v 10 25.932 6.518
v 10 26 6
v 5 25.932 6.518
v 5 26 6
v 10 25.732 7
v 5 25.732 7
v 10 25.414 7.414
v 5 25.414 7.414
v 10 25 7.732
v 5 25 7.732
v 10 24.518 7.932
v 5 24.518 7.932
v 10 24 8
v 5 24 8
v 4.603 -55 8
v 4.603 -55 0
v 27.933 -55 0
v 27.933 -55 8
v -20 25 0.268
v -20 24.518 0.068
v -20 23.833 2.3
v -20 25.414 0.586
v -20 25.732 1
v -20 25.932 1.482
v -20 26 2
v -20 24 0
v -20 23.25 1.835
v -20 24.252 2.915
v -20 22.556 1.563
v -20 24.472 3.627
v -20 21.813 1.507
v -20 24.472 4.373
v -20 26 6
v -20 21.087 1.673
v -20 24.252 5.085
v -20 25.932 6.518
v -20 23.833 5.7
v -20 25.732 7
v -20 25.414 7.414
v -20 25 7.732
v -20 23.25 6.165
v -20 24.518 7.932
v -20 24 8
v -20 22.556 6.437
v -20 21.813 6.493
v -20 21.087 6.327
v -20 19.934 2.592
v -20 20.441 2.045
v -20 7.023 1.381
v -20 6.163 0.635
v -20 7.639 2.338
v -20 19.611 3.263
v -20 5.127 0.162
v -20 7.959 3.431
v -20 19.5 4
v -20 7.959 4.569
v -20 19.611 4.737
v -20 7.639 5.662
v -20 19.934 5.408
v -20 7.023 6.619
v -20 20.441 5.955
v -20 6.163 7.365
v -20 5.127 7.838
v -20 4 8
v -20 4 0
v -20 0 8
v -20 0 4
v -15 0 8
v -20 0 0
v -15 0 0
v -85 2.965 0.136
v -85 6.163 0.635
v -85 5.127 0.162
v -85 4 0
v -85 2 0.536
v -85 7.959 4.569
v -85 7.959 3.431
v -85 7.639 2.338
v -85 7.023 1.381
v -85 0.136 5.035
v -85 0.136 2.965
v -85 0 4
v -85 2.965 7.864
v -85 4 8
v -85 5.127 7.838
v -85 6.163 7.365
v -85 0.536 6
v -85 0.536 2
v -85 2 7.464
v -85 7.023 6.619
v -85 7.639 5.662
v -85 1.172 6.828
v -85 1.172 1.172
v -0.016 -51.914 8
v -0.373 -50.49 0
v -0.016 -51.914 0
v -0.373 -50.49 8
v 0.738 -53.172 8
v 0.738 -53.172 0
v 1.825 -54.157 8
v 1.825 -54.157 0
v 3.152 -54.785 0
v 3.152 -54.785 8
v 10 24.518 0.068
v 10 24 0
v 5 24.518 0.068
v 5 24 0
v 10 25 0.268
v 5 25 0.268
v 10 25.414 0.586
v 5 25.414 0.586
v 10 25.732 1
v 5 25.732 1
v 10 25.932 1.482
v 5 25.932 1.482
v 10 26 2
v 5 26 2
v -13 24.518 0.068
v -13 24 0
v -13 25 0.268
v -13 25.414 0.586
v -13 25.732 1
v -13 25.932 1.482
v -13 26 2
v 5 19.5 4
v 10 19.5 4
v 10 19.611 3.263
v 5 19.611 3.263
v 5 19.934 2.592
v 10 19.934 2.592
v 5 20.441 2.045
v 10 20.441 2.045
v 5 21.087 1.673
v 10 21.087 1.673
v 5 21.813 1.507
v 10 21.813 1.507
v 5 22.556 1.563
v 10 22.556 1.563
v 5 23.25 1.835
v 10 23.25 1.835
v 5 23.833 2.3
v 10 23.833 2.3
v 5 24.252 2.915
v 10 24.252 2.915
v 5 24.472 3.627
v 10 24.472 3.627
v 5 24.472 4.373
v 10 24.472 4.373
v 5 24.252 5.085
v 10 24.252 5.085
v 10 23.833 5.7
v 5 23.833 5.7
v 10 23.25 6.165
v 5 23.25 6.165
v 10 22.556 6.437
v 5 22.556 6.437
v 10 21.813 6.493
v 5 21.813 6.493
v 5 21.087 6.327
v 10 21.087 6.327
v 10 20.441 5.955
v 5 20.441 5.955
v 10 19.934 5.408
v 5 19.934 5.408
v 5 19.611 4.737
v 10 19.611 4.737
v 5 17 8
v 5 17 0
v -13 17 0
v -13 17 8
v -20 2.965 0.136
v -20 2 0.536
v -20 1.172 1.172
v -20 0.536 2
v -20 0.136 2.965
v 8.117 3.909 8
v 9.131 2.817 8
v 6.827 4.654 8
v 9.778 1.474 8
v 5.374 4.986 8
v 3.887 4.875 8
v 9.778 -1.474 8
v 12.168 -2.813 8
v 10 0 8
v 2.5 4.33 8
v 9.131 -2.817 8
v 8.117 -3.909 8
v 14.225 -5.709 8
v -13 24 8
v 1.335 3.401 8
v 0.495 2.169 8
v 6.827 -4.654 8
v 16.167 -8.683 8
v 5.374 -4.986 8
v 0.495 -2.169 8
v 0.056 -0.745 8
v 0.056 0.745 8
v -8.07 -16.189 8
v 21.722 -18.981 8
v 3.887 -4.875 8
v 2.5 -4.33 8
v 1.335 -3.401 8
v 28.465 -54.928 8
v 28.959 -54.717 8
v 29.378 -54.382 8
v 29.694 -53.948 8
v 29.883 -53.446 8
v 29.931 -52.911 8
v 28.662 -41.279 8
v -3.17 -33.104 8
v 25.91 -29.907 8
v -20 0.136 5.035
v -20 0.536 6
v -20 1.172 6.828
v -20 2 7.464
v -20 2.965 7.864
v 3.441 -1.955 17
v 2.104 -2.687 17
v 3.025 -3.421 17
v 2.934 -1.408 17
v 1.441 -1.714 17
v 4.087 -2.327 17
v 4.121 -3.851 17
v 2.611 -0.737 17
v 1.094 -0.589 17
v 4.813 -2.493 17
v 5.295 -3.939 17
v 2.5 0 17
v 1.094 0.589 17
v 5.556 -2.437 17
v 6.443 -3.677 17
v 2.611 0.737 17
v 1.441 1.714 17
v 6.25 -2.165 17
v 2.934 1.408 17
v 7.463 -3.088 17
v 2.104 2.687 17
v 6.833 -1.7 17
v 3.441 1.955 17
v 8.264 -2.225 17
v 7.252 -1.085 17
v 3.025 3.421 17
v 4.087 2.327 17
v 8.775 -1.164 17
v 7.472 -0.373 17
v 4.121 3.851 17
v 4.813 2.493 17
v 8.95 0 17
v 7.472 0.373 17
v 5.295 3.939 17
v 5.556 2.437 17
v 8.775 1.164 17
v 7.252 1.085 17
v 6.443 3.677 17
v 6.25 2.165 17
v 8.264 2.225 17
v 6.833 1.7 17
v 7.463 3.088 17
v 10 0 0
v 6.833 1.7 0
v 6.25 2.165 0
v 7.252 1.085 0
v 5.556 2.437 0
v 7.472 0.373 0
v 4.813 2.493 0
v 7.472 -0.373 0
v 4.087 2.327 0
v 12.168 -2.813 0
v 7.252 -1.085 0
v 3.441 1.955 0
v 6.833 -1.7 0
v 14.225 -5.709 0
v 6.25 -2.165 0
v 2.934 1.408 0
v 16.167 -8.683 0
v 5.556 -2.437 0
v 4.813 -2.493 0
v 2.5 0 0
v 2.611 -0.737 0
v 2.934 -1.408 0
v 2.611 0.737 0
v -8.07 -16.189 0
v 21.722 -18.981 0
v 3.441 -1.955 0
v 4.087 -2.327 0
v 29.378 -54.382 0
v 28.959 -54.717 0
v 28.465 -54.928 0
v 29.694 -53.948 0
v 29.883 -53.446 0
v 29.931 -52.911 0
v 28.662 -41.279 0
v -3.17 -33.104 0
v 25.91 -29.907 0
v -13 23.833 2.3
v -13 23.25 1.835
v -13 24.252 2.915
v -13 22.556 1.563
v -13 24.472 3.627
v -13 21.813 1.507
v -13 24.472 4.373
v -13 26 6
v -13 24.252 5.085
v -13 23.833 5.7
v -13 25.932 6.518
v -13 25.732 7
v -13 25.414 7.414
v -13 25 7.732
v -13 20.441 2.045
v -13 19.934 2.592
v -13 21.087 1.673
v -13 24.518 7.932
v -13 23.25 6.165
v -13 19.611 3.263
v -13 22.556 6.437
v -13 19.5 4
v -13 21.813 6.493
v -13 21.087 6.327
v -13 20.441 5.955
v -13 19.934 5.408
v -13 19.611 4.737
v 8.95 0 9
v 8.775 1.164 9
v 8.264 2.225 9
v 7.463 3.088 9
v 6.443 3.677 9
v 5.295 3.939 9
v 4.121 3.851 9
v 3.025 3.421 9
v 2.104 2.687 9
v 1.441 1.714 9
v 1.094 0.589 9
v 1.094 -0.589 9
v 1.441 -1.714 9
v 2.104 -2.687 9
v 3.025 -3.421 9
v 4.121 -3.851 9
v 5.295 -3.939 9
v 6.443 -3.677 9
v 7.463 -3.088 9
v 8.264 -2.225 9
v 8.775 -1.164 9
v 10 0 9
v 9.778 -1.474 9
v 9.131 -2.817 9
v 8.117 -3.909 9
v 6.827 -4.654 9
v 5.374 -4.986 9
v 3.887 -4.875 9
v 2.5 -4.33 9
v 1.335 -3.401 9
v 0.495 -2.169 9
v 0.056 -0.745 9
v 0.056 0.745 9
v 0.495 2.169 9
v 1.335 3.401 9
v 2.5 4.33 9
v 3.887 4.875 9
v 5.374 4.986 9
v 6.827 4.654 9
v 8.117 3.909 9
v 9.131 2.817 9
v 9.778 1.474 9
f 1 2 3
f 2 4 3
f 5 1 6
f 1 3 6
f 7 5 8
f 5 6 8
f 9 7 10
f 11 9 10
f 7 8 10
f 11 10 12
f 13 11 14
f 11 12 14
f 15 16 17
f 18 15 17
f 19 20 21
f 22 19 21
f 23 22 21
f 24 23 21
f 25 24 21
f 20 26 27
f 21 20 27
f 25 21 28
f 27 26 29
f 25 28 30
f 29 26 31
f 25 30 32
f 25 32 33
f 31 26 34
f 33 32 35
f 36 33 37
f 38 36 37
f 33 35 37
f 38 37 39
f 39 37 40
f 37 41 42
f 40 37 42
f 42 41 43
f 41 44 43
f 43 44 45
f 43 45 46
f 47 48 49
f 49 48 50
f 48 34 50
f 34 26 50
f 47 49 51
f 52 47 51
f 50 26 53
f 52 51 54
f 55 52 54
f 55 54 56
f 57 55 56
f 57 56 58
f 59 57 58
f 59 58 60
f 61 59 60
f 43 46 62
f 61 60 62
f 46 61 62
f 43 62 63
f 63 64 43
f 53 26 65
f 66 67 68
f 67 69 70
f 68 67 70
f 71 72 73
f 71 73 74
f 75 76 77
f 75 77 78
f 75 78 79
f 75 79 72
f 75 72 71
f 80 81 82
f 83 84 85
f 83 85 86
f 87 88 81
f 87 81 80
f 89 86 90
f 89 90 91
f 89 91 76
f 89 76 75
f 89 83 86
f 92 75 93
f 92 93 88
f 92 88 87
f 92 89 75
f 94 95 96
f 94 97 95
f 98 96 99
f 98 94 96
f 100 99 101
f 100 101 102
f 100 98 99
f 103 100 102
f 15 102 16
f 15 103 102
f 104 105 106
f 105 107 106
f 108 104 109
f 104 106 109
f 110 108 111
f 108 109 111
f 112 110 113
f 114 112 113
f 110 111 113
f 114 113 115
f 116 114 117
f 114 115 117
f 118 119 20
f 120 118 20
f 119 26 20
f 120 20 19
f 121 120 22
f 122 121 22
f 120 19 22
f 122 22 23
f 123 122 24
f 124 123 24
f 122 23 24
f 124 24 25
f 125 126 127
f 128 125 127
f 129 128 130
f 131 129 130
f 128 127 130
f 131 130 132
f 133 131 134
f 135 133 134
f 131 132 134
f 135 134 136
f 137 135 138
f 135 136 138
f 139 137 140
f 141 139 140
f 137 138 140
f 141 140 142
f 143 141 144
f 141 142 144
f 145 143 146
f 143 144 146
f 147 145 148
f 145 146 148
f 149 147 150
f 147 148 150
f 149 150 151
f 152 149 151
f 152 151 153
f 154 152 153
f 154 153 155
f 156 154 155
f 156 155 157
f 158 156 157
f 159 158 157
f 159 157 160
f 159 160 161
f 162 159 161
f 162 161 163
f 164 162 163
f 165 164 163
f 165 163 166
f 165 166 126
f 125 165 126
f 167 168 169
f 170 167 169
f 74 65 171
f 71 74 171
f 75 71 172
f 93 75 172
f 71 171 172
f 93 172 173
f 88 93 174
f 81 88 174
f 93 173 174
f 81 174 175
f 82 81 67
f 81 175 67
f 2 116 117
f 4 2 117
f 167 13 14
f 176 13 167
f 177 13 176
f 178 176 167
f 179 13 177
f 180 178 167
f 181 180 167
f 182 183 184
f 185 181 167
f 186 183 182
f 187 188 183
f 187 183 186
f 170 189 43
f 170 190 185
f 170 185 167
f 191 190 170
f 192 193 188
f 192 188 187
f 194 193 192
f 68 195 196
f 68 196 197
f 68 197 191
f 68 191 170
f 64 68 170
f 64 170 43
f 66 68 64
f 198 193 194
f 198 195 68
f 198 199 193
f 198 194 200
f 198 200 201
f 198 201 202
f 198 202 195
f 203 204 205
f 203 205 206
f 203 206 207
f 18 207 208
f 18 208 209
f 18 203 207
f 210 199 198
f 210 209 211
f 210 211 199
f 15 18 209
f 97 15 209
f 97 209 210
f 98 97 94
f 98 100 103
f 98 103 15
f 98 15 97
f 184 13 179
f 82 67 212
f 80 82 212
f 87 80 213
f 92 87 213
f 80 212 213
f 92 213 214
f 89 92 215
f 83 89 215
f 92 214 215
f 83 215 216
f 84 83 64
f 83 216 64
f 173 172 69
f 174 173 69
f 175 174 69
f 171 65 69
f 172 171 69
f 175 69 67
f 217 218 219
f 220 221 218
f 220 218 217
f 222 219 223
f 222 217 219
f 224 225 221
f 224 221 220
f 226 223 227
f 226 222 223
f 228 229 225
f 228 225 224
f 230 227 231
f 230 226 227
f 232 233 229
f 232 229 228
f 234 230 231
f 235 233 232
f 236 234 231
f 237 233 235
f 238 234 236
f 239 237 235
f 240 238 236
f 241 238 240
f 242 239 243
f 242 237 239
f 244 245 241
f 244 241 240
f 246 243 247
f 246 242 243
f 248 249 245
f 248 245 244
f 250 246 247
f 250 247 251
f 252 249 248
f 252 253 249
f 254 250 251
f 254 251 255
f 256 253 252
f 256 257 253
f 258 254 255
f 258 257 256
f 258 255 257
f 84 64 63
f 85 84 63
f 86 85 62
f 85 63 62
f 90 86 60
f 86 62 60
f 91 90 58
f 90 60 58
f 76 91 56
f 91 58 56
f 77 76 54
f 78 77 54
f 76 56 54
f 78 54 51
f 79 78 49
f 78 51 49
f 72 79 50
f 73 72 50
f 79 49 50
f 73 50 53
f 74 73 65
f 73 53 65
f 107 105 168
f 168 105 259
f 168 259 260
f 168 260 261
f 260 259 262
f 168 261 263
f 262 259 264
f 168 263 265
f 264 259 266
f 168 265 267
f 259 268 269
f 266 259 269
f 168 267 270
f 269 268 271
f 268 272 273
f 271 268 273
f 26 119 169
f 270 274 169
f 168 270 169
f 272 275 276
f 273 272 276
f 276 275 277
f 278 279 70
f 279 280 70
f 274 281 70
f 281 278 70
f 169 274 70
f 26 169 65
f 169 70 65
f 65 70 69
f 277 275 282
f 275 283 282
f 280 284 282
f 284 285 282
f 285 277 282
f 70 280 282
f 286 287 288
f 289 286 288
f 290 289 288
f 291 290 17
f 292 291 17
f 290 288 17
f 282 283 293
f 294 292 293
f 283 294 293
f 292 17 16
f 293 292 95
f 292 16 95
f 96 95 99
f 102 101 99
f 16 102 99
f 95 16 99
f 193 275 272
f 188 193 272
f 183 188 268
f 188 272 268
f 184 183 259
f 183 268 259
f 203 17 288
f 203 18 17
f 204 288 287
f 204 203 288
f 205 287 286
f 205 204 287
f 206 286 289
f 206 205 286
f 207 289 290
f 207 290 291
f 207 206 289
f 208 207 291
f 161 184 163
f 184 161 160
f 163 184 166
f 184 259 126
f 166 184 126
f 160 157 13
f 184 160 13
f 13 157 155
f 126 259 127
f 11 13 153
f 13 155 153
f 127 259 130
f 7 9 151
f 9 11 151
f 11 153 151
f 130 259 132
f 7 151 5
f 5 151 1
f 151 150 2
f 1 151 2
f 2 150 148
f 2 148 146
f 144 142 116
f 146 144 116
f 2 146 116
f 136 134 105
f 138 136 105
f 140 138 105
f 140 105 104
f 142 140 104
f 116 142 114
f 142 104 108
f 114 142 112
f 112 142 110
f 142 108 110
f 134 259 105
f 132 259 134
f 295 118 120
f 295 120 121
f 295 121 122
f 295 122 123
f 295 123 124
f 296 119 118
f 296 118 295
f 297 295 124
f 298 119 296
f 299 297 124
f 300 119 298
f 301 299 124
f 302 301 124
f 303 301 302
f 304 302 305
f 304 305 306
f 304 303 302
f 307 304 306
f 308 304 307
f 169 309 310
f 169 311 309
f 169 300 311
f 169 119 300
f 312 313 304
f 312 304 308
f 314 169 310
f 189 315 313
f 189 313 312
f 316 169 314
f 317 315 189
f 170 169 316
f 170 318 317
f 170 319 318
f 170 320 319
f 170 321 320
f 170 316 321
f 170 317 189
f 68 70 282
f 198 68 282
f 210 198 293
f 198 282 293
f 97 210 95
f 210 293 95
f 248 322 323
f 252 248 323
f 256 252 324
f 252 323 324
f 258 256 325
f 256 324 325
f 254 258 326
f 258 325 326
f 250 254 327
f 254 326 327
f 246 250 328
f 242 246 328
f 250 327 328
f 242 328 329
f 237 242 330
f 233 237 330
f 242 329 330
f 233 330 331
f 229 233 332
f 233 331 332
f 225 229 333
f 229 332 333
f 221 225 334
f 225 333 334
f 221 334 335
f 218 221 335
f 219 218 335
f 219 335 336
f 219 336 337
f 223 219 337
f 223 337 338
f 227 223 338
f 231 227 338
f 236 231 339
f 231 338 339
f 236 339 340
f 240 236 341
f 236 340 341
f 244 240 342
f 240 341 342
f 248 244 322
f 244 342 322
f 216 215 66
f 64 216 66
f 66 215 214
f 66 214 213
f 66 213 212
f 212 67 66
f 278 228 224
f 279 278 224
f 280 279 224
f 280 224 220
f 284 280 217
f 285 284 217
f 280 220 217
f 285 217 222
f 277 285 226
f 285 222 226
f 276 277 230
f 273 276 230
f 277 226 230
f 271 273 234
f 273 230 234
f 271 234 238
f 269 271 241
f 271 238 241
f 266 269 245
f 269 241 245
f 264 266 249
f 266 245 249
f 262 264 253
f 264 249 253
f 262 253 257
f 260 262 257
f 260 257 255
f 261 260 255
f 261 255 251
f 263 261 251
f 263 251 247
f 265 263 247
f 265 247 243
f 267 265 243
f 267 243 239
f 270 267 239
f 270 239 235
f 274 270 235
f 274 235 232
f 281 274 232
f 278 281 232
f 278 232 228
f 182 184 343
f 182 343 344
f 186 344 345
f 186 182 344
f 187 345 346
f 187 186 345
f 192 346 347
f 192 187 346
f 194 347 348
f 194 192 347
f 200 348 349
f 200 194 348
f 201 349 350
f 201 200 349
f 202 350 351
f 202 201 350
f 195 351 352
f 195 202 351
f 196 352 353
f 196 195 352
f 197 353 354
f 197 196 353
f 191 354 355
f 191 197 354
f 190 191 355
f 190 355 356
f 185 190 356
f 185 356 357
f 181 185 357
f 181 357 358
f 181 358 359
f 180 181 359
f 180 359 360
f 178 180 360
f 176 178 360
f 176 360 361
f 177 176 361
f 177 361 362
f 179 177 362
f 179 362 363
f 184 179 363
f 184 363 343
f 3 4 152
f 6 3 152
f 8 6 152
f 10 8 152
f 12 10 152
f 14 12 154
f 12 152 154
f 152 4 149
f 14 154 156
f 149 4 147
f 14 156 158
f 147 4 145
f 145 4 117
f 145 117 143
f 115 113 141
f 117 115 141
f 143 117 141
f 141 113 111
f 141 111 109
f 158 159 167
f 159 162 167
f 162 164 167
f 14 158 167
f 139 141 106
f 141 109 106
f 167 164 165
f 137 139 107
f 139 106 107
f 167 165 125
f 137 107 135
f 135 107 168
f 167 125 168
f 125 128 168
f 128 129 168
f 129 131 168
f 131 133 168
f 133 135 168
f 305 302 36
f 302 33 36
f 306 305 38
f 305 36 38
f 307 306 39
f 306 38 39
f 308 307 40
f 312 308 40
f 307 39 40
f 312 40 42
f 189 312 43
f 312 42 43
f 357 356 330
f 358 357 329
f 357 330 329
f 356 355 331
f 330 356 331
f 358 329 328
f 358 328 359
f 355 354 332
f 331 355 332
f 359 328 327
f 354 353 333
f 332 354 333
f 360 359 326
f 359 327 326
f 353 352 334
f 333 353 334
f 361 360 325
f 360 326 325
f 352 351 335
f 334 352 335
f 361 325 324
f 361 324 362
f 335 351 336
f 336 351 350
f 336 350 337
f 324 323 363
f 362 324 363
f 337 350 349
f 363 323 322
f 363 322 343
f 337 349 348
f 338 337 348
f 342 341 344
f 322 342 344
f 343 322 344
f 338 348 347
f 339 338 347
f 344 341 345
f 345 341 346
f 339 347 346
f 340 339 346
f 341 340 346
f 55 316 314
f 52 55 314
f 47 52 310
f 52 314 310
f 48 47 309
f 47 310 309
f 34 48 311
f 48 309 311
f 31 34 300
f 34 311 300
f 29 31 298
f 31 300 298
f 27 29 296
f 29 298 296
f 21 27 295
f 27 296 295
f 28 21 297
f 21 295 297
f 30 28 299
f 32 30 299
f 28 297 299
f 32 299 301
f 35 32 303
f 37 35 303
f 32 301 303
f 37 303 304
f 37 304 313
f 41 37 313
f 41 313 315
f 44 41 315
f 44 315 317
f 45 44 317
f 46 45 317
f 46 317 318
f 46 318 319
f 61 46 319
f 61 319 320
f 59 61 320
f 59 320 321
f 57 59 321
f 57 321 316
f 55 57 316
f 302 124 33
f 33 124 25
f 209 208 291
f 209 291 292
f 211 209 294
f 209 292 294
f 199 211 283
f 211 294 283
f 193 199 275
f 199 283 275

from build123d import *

# Parameters (mm, degrees)
F1_DEPTH  = 8
F3_DEPTH  = 50
F4_R      = 5
F5_DEPTH  = 9
F7_DEPTH  = 8
F9_DEPTH  = 25
F11_DEPTH = 65
F12_DEPTH = 1
F13_R     = 5
F14_R     = 2
F15_R     = 2


with BuildPart() as f1:
    # F0 (on Top) → F1 (new body)
    with BuildSketch(Plane.XY):
        Polygon((-15, 0), (0, 0), (10, 0), (10, 15), (10, 25), (5, 25), (5, 17), (-5, 17), (-13, 17), (-13, 25), (-20, 25), (-20, 0), align=None)
        with BuildLine():
            Line((10, 0), (0, 0))
            Line((0, 0), (-15, 0))
            ThreePointArc((-15, 0), (-4.7480671489, -26.7494728588), (0, -55))
            Line((0, -55), (10, -55))
            Line((10, -55), (10, 0))
        make_face()
        with BuildLine():
            ThreePointArc((16.1671913498, -8.6829612821), (13.2107261045, -4.2511845243), (10, 0))
            Line((10, 0), (10, -55))
            Line((10, -55), (30, -55))
            ThreePointArc((30, -55), (26.2150971911, -30.9062424985), (16.1671913498, -8.6829612821))
        make_face()
    extrude(amount=F1_DEPTH)

    # F2 (on face) → F3 (cut)
    with BuildSketch(Plane.YZ.offset(10)):
        with BuildLine():
            Line((22, 4), (24.5, 4))
            ThreePointArc((24.5, 4), (22, 6.5), (19.5, 4))
            Line((19.5, 4), (22, 4))
        make_face()
        with BuildLine():
            ThreePointArc((19.5, 4), (22, 1.5), (24.5, 4))
            Line((24.5, 4), (22, 4))
            Line((22, 4), (19.5, 4))
        make_face()
    extrude(amount=-F3_DEPTH, mode=Mode.SUBTRACT)

    # F4 (on face) → F5 (join)
    with BuildSketch(Plane(origin=(0, 0, 0), x_dir=(1, 0, 0), z_dir=(0, 0, -1))):
        with Locations((5, 0)):
            Circle(F4_R)
    extrude(amount=-F5_DEPTH)

    # F6 (on face) → F7 (join)
    with BuildSketch(Plane.XY.offset(9)):
        with BuildLine():
            ThreePointArc((1.05, 0), (5, -3.95), (8.95, 0))
            Line((8.95, 0), (1.05, 0))
        make_face()
        with BuildLine():
            Line((1.05, 0), (8.95, 0))
            ThreePointArc((8.95, 0), (5, 3.95), (1.05, 0))
        make_face()
    extrude(amount=F7_DEPTH)

    # F8 (on face) → F9 (cut)
    with BuildSketch(Plane.XY.offset(17)):
        with BuildLine():
            Line((2.5, 0), (7.5, 0))
            ThreePointArc((7.5, 0), (5, 2.5), (2.5, 0))
        make_face()
        with BuildLine():
            ThreePointArc((2.5, 0), (5, -2.5), (7.5, 0))
            Line((7.5, 0), (2.5, 0))
        make_face()
    extrude(amount=-F9_DEPTH, mode=Mode.SUBTRACT)

    # F10 (on face) → F11 (join)
    with BuildSketch(Plane(origin=(-20, 0, 0), x_dir=(0, -1, 0), z_dir=(-1, 0, 0))):
        with BuildLine():
            ThreePointArc((-4, 0), (-1.1715728753, 1.1715728753), (0, 4))
            ThreePointArc((0, 4), (-1.1715728753, 6.8284271247), (-4, 8))
            ThreePointArc((-4, 8), (-8, 4), (-4, 0))
        make_face()
    extrude(amount=F11_DEPTH)

    # F12 (add): faces of the model
    f12_faces = [f1.faces().sort_by_distance(p)[0] for p in [
        (-16.5, 25, 4),
        (7.5, 25, 4),
    ]]
    extrude(f12_faces, amount=F12_DEPTH)

    # F13
    f13_edges = [f1.edges().sort_by_distance(p)[0] for p in [
        (0, -55, 4),
    ]]
    fillet(f13_edges, radius=F13_R)

    # F14
    f14_edges = [f1.edges().sort_by_distance(p)[0] for p in [
        (30, -55, 4),
    ]]
    fillet(f14_edges, radius=F14_R)

    # F15
    f15_edges = [f1.edges().sort_by_distance(p)[0] for p in [
        (-16.5, 26, 8),
        (7.5, 26, 8),
        (7.5, 26, 0),
        (-16.5, 26, 0),
    ]]
    fillet(f15_edges, radius=F15_R)


solid = f1.part
